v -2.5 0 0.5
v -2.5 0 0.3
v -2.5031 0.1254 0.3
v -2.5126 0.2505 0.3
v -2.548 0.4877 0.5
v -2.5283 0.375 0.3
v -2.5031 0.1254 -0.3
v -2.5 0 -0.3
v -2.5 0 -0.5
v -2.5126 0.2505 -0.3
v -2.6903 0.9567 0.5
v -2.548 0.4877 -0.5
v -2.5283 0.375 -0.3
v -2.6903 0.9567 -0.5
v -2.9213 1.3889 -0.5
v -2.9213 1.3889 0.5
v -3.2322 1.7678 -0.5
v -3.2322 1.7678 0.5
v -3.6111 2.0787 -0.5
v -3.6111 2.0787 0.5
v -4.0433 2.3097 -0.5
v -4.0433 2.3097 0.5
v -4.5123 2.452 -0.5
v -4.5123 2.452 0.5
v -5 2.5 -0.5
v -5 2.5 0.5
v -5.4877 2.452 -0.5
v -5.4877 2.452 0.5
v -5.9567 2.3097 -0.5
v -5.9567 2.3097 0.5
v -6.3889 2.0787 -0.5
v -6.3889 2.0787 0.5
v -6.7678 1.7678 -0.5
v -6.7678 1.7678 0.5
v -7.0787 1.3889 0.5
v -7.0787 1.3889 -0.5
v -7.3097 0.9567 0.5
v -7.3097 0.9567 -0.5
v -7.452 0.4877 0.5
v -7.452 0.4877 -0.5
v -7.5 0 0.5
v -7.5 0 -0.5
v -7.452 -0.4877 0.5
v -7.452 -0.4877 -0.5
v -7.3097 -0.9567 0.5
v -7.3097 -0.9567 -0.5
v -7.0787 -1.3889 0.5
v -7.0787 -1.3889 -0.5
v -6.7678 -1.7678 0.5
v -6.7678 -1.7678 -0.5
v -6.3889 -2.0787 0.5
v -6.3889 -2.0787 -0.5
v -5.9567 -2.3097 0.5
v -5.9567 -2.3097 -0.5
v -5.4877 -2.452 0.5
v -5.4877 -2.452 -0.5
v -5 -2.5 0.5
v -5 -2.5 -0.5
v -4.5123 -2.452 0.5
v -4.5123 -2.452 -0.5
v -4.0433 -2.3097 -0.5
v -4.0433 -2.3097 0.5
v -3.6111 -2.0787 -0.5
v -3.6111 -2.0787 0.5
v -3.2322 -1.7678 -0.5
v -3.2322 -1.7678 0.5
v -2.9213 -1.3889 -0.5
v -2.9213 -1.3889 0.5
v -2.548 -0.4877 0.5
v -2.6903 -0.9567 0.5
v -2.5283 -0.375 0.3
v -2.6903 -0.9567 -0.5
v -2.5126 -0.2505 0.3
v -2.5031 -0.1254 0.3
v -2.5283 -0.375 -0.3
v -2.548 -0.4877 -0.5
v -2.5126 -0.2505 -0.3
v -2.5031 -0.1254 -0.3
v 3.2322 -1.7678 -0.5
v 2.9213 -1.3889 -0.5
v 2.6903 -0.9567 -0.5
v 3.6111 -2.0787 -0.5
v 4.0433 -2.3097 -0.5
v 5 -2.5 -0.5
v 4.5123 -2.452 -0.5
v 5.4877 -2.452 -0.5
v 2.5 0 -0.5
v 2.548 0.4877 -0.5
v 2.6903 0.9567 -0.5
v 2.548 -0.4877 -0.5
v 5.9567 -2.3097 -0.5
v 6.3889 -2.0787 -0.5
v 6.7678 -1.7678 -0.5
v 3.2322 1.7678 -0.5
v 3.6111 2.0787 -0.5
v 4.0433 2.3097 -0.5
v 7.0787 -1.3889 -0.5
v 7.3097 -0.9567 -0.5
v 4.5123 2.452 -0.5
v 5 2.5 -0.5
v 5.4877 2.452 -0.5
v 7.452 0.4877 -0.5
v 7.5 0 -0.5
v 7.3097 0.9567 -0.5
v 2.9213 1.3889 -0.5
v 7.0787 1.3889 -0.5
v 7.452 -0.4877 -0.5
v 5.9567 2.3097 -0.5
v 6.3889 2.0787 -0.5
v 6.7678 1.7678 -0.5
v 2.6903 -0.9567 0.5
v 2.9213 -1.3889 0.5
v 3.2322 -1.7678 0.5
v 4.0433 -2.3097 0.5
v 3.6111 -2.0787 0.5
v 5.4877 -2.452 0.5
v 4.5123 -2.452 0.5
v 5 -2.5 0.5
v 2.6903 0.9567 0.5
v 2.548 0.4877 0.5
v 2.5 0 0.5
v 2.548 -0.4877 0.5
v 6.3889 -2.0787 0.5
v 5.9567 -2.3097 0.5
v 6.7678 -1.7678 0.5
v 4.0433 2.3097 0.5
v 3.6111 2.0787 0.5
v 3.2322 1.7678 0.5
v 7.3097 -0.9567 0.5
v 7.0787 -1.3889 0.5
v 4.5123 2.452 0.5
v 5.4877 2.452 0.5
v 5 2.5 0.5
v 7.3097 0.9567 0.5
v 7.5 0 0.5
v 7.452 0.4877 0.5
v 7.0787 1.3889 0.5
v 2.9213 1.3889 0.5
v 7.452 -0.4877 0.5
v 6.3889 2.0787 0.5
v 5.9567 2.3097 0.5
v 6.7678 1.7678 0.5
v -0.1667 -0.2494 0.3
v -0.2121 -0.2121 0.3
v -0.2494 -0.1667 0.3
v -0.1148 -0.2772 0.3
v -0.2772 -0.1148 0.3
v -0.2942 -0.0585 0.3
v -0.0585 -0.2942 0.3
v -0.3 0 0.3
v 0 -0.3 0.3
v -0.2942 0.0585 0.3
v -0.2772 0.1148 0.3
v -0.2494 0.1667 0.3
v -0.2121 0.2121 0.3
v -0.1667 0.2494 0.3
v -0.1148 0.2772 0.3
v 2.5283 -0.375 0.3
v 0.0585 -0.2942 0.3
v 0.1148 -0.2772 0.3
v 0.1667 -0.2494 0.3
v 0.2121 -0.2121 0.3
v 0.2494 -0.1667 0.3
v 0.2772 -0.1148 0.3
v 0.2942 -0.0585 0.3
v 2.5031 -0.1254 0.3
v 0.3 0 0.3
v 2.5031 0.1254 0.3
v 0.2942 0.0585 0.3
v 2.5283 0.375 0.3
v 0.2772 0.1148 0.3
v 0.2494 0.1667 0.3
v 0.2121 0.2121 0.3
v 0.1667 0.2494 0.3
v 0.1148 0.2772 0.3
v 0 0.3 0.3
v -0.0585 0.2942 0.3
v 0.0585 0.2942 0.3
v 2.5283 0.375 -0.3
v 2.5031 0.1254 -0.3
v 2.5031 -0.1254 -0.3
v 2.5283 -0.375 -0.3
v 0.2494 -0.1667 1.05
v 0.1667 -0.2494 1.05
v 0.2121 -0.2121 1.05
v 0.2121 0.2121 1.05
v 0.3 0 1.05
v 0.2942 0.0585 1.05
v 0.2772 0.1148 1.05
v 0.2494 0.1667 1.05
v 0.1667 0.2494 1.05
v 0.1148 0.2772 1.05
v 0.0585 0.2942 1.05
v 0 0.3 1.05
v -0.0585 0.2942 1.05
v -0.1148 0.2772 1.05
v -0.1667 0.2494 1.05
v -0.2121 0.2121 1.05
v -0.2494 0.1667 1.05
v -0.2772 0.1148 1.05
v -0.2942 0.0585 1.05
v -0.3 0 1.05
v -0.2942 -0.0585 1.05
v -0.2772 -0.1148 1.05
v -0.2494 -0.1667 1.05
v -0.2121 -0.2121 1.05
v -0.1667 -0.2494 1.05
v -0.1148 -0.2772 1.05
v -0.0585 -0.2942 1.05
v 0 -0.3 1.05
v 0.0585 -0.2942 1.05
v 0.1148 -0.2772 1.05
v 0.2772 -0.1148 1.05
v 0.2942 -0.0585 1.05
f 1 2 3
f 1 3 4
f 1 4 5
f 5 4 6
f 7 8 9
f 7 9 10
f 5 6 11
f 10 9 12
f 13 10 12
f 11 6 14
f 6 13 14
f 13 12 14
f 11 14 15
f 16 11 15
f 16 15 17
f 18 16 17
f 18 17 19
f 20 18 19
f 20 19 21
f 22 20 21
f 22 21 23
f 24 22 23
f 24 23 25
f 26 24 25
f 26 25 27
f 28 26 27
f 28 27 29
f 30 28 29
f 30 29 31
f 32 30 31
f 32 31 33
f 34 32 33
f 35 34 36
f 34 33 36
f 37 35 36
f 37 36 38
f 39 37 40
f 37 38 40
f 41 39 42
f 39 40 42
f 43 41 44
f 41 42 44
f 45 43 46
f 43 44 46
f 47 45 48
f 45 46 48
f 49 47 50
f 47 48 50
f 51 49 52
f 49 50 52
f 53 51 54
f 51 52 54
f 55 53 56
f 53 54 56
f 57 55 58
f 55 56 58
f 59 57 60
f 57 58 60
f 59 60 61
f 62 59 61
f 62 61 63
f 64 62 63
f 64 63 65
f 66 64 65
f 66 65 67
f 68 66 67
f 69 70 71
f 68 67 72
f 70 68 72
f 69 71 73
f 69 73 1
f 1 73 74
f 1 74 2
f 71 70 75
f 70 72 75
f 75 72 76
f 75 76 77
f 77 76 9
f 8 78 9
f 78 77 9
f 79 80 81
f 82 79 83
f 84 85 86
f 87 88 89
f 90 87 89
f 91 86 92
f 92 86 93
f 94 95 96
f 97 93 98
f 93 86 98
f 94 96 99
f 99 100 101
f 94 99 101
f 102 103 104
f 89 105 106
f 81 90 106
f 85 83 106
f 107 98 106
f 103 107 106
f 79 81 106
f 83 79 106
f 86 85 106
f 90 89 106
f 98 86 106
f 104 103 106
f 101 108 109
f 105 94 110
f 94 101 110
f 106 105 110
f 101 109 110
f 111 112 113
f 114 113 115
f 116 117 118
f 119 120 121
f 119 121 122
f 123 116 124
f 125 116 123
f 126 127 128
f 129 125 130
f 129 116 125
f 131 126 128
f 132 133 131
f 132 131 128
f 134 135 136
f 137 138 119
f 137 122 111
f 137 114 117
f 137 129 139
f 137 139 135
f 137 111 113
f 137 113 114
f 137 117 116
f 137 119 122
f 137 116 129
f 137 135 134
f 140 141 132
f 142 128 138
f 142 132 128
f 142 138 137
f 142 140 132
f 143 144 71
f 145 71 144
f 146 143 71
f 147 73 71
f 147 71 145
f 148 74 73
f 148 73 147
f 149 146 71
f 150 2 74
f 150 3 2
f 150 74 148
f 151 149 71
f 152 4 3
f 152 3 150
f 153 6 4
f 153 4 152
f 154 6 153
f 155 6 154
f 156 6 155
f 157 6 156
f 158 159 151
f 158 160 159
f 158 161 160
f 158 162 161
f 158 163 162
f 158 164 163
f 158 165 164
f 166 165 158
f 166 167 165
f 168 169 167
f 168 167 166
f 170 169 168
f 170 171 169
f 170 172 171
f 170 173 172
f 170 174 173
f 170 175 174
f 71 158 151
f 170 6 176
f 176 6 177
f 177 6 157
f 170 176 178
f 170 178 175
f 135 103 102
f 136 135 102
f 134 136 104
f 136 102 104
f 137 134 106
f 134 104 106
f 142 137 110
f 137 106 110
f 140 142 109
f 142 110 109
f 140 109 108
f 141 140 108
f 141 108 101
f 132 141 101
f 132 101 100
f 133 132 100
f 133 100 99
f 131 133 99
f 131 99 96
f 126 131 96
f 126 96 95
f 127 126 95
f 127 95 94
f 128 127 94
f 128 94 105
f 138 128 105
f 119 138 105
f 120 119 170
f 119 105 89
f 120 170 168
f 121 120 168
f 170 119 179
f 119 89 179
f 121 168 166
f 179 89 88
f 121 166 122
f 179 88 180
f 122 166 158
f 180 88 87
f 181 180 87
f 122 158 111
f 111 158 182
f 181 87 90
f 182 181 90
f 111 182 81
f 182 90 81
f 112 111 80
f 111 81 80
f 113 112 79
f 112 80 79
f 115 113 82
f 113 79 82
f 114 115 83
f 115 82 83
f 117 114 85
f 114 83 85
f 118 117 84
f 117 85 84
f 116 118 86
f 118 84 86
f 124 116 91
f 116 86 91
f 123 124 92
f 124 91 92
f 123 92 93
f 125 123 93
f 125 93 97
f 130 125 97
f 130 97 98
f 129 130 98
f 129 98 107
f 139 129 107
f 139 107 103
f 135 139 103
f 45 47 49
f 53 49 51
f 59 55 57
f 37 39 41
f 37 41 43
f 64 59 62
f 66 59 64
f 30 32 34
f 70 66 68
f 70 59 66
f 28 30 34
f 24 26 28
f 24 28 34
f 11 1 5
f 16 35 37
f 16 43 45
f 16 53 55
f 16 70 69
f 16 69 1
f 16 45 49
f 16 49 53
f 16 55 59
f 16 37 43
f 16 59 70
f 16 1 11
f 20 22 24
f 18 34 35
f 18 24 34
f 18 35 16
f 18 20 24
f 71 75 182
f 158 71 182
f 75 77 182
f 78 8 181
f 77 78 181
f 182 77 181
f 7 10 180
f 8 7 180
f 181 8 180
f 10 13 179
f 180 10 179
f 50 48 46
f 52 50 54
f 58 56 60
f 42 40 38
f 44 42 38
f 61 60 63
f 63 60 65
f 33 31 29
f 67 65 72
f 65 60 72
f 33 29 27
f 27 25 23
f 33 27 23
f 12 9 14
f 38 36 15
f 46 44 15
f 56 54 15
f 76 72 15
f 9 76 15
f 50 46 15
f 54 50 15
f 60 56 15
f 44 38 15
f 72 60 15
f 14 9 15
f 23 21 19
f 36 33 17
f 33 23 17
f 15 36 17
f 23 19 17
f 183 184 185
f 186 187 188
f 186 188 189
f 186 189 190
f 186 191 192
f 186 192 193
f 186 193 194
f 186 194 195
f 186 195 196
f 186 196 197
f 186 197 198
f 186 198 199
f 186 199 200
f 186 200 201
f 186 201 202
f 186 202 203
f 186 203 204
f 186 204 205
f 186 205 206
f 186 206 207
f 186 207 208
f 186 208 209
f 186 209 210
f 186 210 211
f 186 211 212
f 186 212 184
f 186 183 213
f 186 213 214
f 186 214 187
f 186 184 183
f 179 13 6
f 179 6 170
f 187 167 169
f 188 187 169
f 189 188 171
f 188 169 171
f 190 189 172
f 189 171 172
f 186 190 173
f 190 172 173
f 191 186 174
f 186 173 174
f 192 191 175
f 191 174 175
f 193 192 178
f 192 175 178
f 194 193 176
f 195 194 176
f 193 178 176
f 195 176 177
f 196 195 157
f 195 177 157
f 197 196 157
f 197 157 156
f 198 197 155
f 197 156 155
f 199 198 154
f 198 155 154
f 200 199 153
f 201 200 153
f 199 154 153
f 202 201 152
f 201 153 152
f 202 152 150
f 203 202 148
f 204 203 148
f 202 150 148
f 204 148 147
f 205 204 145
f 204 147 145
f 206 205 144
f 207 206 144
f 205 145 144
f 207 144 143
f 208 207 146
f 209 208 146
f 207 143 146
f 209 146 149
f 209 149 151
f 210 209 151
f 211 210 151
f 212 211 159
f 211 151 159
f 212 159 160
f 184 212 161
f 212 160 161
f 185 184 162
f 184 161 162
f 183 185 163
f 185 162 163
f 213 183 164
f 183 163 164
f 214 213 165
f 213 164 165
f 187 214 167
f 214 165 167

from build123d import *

# Parameters (mm, degrees)
CYLINDER142_R     = 2.5
CYLINDER142_DEPTH = 1
CYLINDER141_R     = 2.5
CYLINDER141_DEPTH = 1
CYLINDER140_R     = 0.3
CYLINDER140_DEPTH = 0.75
BOX_W             = 10
BOX_H             = 0.75
BOX_DEPTH         = 0.6


with BuildPart() as mountingholeod001:
    # Cylinder142 → Cylinder142 (new body)
    with BuildSketch(Plane(origin=(5, 0, -0.5), x_dir=(1, 0, 0), z_dir=(0, 0, 1))):
        Circle(CYLINDER142_R)
    extrude(amount=CYLINDER142_DEPTH)


with BuildPart() as mountingholeod:
    # Cylinder141 → Cylinder141 (new body)
    with BuildSketch(Plane(origin=(-5, 0, -0.5), x_dir=(1, 0, 0), z_dir=(0, 0, 1))):
        Circle(CYLINDER141_R)
    extrude(amount=CYLINDER141_DEPTH)


with BuildPart() as nozzle_od:
    # Cylinder140 → Cylinder140 (new body)
    with BuildSketch(Plane.XY.offset(0.3)):
        Circle(CYLINDER140_R)
    extrude(amount=CYLINDER140_DEPTH)


with BuildPart() as fusion:
    # Box → Box (new body)
    with BuildSketch(Plane(origin=(-5, -0.375, -0.3), x_dir=(1, 0, 0), z_dir=(0, 0, 1))):
        with Locations((5, 0.375)):
            Rectangle(BOX_W, BOX_H)
    extrude(amount=BOX_DEPTH)

    # Fusion: union MountingHoleOD001, MountingHoleOD, Nozzle_OD
    add(mountingholeod001.part)
    add(mountingholeod.part)
    add(nozzle_od.part)


solid = fusion.part
